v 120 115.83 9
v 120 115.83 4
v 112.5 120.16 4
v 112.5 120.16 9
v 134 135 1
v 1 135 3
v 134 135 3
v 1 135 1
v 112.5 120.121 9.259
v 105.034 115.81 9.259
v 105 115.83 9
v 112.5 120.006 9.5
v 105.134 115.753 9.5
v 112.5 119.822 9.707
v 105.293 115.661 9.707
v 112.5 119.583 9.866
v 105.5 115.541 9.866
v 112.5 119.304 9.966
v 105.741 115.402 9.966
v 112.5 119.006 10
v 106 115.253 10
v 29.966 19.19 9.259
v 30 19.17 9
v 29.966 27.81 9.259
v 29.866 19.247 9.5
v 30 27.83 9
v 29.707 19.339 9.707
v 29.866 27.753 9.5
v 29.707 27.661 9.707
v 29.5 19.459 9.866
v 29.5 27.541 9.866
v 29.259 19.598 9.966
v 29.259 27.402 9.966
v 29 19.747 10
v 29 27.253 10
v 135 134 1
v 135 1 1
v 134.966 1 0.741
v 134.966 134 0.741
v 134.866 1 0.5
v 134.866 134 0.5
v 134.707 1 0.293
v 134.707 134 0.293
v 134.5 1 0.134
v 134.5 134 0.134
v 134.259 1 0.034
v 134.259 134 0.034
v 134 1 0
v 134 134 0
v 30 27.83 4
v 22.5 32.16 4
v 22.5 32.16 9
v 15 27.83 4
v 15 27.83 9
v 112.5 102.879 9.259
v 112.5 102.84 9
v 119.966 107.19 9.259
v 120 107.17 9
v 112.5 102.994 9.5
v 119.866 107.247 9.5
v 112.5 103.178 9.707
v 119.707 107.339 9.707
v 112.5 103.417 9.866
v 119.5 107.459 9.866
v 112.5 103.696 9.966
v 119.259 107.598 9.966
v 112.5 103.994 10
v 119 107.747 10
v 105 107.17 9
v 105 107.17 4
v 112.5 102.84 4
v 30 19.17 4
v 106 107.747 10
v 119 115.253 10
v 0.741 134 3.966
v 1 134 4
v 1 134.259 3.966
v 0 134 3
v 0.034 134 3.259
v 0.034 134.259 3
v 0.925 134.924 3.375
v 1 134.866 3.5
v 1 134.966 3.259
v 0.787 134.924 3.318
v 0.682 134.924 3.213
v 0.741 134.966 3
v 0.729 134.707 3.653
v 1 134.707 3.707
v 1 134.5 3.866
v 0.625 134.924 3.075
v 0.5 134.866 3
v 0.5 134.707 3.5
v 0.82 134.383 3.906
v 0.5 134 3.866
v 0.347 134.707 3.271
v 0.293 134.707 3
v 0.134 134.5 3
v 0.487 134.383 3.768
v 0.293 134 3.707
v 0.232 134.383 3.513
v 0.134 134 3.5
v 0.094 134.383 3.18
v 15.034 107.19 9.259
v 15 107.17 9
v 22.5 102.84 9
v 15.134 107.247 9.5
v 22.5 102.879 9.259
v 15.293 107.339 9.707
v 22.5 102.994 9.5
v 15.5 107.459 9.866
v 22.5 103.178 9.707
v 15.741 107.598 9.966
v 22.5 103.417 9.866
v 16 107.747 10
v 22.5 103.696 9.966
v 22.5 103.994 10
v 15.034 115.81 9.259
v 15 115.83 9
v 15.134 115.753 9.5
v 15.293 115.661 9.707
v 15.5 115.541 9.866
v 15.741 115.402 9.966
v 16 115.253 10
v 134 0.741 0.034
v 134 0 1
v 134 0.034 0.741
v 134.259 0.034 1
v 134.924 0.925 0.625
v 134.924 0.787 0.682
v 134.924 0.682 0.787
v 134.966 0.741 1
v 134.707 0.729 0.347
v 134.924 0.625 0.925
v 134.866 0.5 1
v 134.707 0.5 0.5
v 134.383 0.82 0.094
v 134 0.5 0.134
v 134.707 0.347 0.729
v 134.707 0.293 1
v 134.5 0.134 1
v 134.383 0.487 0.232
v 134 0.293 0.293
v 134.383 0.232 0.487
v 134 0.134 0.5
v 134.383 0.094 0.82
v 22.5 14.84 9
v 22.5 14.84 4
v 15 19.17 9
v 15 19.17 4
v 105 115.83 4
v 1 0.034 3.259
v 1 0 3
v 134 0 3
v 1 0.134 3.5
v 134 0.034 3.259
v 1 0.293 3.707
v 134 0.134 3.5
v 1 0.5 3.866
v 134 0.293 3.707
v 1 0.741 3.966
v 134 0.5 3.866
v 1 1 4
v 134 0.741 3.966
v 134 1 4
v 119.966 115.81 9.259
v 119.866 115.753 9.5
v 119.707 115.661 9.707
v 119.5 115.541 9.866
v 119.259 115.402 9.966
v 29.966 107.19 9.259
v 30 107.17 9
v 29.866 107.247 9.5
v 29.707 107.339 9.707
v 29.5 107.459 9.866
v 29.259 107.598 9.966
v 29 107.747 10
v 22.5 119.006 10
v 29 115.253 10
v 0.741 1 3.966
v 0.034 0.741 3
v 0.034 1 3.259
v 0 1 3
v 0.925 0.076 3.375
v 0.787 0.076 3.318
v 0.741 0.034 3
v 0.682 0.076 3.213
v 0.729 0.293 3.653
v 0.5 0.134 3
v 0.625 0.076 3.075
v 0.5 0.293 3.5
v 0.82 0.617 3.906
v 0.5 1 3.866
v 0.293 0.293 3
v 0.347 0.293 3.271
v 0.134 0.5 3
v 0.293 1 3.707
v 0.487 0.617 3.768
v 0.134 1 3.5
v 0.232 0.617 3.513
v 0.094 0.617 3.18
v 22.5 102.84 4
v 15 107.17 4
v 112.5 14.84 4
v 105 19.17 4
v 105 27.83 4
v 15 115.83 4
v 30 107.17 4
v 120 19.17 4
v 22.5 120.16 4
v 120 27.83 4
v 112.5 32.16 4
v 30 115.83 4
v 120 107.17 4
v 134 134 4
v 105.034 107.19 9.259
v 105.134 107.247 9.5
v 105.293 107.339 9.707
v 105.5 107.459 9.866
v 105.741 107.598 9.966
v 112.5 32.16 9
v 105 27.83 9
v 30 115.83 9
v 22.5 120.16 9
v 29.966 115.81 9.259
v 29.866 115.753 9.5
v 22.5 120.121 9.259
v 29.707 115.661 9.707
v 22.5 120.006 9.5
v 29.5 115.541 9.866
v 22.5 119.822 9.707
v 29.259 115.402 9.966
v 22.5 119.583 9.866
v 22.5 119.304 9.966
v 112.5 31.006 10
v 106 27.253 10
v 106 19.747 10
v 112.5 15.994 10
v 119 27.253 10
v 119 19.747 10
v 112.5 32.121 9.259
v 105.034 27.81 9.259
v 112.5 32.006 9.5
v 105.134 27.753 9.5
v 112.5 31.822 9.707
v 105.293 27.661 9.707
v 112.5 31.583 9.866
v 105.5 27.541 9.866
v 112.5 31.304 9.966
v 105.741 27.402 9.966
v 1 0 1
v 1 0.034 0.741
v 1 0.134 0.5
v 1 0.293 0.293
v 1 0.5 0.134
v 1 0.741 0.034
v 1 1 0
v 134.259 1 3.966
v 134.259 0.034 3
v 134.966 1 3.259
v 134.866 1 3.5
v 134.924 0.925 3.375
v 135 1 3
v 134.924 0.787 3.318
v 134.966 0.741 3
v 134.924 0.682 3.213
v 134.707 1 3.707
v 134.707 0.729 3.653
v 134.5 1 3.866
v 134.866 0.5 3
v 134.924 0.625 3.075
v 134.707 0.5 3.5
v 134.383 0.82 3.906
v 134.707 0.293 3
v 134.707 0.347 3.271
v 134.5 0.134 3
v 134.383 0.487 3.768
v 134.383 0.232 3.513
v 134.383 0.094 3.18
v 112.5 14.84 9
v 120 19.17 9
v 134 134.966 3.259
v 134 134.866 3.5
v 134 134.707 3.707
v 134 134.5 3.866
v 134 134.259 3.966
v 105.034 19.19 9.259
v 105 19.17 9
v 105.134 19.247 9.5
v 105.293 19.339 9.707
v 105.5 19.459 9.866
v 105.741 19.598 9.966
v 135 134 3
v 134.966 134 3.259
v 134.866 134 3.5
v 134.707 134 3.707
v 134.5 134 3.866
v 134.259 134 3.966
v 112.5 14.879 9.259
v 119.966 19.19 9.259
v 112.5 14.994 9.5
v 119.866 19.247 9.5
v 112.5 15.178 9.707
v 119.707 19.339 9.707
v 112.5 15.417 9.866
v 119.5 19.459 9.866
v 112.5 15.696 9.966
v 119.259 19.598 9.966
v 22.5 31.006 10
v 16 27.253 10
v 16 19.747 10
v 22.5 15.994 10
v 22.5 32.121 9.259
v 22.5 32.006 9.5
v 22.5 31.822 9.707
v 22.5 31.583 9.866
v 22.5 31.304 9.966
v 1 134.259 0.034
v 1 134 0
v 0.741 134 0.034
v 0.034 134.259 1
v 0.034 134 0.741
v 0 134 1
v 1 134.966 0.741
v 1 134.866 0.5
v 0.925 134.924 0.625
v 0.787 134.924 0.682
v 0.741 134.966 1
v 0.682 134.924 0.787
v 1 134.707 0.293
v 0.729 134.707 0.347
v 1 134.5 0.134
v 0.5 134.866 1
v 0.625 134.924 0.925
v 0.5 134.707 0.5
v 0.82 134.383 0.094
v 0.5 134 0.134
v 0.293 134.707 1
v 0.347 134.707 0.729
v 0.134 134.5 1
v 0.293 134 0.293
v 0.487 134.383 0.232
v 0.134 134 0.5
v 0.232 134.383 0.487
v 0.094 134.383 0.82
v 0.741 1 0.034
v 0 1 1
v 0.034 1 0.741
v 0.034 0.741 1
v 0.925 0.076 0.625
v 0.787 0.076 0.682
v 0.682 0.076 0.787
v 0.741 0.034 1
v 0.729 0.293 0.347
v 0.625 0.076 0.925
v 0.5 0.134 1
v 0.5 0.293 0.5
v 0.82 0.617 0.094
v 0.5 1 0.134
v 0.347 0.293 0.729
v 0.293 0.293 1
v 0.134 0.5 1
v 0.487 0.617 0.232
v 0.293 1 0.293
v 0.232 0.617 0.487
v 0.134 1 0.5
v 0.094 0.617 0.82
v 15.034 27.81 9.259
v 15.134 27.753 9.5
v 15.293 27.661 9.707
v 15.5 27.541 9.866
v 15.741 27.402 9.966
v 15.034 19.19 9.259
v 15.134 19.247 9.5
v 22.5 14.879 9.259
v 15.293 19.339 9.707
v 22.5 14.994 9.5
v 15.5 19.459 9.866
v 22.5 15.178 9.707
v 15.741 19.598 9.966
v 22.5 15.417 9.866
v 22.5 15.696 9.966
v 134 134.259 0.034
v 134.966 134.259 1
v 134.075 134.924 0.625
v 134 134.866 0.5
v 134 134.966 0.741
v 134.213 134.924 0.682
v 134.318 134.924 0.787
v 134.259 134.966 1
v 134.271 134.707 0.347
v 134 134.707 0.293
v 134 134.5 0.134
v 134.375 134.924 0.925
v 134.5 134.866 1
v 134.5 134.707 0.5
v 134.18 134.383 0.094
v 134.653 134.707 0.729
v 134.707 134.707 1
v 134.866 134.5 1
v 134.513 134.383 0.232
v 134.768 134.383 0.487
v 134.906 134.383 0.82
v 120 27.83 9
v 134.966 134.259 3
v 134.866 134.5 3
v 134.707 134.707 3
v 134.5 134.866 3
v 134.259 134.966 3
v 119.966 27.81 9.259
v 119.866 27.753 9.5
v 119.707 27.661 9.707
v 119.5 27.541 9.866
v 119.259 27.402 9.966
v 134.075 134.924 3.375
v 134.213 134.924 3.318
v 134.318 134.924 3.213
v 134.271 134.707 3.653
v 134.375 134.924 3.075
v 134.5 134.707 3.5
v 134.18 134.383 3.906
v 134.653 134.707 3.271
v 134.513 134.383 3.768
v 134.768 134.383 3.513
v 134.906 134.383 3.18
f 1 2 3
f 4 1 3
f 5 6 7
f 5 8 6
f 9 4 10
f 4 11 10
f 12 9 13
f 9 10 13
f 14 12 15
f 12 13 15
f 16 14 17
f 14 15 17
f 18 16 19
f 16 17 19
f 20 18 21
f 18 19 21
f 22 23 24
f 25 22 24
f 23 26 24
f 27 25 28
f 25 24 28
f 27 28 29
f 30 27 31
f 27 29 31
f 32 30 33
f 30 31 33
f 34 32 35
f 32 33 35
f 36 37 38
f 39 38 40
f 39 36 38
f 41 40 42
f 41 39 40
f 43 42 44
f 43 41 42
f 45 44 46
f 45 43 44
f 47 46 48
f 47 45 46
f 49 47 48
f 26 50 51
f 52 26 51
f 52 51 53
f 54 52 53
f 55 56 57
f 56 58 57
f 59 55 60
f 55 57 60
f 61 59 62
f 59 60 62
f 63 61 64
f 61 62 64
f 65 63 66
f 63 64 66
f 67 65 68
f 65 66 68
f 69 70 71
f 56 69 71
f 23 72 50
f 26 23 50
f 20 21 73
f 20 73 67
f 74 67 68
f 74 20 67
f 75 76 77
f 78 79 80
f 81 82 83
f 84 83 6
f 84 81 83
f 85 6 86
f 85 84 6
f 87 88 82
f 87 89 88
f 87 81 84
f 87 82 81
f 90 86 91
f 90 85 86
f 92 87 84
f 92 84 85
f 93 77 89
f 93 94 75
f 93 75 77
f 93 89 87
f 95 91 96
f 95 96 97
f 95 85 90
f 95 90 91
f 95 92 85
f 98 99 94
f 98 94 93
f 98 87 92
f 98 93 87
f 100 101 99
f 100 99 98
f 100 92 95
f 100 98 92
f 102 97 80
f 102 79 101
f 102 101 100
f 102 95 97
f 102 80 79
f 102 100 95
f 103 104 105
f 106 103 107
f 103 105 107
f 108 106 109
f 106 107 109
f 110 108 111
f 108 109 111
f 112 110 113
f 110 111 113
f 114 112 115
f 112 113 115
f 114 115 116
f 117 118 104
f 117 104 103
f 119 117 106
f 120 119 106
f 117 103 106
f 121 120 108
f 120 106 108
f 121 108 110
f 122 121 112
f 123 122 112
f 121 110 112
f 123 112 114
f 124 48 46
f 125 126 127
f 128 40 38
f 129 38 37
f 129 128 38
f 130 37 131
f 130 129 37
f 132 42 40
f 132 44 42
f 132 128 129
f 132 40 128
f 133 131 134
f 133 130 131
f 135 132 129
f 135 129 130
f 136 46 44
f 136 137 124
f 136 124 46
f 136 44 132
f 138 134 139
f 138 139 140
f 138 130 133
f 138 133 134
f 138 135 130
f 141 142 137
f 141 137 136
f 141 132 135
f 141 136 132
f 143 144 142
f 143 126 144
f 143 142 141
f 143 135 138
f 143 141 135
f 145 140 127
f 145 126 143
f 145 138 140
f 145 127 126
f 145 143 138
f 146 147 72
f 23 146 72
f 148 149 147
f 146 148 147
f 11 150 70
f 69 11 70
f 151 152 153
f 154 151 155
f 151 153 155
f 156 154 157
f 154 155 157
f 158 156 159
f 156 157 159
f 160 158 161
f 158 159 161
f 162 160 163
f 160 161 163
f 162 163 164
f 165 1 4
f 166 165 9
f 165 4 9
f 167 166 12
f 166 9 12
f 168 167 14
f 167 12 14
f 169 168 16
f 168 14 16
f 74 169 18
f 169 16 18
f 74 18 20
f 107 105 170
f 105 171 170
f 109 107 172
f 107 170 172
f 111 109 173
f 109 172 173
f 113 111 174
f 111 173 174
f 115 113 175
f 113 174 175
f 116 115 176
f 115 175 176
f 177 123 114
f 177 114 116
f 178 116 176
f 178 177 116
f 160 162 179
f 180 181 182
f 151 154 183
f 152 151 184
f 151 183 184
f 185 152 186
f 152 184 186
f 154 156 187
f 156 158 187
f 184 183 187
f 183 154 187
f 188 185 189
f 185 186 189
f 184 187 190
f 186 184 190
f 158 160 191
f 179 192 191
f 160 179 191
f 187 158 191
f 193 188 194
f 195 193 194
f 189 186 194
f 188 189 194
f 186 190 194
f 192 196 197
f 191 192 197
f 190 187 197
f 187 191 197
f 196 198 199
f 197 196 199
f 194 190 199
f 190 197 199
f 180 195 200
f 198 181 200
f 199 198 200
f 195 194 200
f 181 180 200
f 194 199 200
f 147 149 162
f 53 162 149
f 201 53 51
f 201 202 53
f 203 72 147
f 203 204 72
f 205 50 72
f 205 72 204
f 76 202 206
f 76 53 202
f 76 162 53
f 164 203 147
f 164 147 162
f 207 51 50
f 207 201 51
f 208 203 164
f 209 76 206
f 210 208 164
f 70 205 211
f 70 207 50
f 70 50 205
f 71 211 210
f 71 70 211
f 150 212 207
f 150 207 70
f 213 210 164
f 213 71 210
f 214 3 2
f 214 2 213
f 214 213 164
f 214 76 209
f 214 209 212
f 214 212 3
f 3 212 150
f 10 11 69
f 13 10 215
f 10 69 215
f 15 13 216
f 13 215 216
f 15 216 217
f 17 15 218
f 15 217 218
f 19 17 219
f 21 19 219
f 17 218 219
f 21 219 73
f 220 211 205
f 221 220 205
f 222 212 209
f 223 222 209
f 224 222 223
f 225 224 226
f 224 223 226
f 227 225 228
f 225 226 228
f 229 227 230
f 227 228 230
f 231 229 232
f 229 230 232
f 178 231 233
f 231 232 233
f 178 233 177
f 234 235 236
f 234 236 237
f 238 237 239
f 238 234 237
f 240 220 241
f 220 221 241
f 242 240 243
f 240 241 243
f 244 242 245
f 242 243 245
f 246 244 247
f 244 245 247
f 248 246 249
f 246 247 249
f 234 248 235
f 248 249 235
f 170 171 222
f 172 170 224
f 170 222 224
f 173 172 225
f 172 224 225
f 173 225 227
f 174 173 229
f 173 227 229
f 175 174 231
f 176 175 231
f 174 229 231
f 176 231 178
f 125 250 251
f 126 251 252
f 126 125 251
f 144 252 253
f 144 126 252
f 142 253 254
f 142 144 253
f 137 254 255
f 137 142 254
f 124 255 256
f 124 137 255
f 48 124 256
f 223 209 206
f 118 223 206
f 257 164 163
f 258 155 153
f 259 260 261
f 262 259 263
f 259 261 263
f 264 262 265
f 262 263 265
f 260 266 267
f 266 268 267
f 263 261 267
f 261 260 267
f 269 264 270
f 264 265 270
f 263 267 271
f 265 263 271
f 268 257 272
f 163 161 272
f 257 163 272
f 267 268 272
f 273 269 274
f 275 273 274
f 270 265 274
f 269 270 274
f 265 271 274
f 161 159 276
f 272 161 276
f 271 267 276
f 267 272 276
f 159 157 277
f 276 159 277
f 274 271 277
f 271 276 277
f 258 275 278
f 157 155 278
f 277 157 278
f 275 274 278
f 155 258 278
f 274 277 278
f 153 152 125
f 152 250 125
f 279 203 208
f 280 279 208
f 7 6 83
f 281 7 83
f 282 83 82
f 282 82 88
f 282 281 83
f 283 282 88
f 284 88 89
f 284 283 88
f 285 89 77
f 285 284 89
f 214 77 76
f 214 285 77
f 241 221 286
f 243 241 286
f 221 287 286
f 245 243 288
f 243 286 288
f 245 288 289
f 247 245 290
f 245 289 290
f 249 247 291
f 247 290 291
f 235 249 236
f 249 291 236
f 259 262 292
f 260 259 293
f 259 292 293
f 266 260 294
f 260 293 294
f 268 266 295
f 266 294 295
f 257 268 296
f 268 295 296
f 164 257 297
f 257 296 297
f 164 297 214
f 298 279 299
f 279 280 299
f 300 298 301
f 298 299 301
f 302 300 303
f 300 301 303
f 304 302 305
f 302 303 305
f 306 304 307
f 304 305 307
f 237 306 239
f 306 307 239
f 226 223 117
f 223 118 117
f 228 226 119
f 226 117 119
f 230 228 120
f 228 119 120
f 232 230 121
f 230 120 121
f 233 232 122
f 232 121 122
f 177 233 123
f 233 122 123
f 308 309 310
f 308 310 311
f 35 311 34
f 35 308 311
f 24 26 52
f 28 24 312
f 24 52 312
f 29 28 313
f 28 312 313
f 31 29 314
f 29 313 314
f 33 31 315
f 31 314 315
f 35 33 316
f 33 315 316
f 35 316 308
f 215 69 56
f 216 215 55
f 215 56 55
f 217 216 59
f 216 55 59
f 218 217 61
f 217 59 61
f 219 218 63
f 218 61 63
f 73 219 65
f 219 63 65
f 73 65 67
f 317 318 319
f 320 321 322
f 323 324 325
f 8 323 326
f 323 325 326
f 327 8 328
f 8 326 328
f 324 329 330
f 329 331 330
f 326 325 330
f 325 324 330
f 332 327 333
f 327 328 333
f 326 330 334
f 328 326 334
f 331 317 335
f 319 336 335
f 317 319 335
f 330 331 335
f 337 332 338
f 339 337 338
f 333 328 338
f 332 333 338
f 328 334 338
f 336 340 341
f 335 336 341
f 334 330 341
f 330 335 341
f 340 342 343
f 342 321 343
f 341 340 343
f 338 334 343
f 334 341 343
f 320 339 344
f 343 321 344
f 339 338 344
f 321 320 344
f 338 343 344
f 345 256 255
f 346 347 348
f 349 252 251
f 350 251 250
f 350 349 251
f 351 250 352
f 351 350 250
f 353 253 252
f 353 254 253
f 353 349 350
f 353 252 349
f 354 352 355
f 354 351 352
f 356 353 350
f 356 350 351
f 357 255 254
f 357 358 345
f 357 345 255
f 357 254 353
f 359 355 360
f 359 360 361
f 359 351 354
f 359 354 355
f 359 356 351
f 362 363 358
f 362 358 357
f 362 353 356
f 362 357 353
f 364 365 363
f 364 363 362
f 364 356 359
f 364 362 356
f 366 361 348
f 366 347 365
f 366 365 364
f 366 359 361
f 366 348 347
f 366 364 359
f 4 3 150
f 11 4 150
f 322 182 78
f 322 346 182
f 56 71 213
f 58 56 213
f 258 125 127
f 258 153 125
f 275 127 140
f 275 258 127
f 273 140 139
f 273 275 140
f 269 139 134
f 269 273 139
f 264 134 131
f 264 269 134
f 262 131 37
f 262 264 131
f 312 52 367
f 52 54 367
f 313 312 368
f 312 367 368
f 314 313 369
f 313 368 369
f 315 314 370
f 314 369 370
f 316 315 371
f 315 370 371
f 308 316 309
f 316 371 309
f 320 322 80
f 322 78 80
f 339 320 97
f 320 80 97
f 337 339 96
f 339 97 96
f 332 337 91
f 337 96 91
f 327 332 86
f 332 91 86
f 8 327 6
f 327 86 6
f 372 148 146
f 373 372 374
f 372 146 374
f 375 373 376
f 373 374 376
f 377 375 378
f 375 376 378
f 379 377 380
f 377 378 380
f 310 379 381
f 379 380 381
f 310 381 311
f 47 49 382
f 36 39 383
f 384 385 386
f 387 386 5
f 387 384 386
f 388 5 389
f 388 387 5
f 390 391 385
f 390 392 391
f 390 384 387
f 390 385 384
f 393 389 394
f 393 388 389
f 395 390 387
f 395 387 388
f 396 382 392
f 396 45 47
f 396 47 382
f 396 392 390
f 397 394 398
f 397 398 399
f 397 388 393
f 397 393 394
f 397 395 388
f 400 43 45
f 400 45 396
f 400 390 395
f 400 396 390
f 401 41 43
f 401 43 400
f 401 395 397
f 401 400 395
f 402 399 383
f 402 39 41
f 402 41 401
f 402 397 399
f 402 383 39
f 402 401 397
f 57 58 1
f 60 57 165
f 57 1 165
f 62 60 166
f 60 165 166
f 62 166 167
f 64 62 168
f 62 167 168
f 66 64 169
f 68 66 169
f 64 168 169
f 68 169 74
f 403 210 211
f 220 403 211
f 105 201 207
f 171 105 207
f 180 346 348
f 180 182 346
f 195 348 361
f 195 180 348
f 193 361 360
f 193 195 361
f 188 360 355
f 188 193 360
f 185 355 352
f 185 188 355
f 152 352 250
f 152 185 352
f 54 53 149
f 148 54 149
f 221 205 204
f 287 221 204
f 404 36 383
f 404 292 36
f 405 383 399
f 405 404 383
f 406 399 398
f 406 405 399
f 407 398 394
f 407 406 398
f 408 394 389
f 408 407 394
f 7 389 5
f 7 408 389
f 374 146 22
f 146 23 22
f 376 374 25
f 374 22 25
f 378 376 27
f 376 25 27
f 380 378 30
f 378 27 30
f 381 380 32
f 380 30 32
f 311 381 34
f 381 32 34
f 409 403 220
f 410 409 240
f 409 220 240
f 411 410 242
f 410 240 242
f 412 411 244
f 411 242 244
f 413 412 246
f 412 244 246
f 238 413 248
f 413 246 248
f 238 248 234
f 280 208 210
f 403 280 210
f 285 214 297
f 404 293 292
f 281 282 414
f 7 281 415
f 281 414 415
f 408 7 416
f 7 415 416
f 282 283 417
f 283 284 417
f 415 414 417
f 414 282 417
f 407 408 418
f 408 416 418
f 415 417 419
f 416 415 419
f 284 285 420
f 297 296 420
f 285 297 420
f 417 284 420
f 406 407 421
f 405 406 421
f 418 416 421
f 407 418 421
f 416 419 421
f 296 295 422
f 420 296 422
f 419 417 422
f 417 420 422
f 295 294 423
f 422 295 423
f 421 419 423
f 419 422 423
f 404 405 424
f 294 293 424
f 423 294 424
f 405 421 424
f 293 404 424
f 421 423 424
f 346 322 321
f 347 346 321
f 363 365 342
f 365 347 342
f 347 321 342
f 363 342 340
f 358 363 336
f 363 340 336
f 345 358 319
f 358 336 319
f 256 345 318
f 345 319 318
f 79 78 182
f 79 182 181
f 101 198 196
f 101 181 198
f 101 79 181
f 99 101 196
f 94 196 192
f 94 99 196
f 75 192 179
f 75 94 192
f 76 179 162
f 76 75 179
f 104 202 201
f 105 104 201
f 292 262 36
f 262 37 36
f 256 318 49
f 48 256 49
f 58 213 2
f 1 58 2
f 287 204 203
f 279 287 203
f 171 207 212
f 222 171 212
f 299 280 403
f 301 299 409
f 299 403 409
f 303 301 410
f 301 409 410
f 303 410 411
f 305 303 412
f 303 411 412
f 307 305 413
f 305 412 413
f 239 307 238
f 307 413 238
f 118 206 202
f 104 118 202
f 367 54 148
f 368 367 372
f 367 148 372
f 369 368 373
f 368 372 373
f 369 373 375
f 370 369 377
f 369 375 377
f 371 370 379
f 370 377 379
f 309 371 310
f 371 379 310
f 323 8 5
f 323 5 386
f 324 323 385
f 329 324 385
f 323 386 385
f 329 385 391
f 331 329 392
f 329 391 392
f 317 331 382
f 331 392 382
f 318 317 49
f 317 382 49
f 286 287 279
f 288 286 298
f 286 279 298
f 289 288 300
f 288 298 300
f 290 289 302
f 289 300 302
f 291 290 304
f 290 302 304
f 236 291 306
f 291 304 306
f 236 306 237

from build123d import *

# Parameters (mm, degrees)
F0_W     = 135
F0_H     = 135
F1_DEPTH = 4
F2_R     = 1
F4_DEPTH = 6
F5_R     = 1


with BuildPart() as f1:
    # F0 (on Top) → F1 (new body)
    with BuildSketch(Plane.XY):
        with Locations((67.5, 67.5)):
            Rectangle(F0_W, F0_H)
    extrude(amount=F1_DEPTH)

    # F2
    f2_edges = [f1.edges().sort_by_distance(p)[0] for p in [
        (0, 67.5, 4),
        (67.5, 0, 4),
        (135, 67.5, 4),
        (67.5, 135, 4),
        (0, 67.5, 0),
        (67.5, 0, 0),
        (135, 67.5, 0),
        (67.5, 135, 0),
        (135, 0, 2),
        (0, 0, 2),
        (135, 135, 2),
        (0, 135, 2),
    ]]
    fillet(f2_edges, radius=F2_R)

    # F3 (on face) → F4 (join)
    with BuildSketch(Plane.XY.offset(4)):
        Polygon((22.5, 102.839746), (30, 107.169873), (30, 115.830127), (22.5, 120.160254), (15, 115.830127), (15, 107.169873), align=None)
        Polygon((120, 115.830127), (112.5, 120.160254), (105, 115.830127), (105, 107.169873), (112.5, 102.839746), (120, 107.169873), align=None)
        Polygon((30, 19.169873), (30, 27.830127), (22.5, 32.160254), (15, 27.830127), (15, 19.169873), (22.5, 14.839746), align=None)
        Polygon((105, 19.169873), (112.5, 14.839746), (120, 19.169873), (120, 27.830127), (112.5, 32.160254), (105, 27.830127), align=None)
    extrude(amount=F4_DEPTH)

    # F5
    f5_edges = [f1.edges().sort_by_distance(p)[0] for p in [
        (26.25, 105.004809, 10),
        (30, 111.5, 10),
        (26.25, 117.995191, 10),
        (18.75, 117.995191, 10),
        (15, 111.5, 10),
        (18.75, 105.004809, 10),
        (116.25, 105.004809, 10),
        (120, 111.5, 10),
        (116.25, 117.995191, 10),
        (108.75, 117.995191, 10),
        (105, 111.5, 10),
        (108.75, 105.004809, 10),
        (108.75, 29.995191, 10),
        (105, 23.5, 10),
        (108.75, 17.004809, 10),
        (116.25, 17.004809, 10),
        (120, 23.5, 10),
        (116.25, 29.995191, 10),
        (26.25, 17.004809, 10),
        (30, 23.5, 10),
        (26.25, 29.995191, 10),
        (18.75, 29.995191, 10),
        (15, 23.5, 10),
        (18.75, 17.004809, 10),
    ]]
    fillet(f5_edges, radius=F5_R)


solid = f1.part
